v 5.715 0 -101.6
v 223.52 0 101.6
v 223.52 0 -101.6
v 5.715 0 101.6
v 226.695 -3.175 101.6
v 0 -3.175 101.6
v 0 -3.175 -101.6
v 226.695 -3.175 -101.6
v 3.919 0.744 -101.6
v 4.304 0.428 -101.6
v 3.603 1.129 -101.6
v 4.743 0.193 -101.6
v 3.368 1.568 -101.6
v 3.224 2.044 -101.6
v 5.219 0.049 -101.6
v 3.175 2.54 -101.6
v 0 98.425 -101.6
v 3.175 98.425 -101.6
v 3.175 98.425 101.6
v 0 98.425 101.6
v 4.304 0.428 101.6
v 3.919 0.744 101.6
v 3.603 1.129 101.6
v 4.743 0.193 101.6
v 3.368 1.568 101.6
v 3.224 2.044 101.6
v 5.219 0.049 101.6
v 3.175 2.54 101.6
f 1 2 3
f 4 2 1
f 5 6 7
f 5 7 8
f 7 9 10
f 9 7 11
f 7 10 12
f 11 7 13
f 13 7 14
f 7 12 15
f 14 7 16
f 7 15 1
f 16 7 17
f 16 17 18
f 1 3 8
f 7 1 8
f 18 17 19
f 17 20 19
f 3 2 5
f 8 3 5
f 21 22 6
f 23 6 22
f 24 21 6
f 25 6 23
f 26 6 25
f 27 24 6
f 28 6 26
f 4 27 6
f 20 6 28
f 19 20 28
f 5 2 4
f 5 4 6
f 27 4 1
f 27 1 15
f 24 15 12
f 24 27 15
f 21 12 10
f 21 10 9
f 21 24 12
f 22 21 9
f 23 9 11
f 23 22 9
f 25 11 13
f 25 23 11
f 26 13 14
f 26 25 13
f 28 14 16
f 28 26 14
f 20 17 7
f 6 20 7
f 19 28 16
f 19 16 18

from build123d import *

# Parameters (mm, degrees)
SKETCH1_W           = 3.175
SKETCH1_H           = 98.425
BOSS_EXTRUDE1_DEPTH = 101.6
CHAMFER1_SIZE       = 5.08


with BuildPart() as part:
    # Sketch1 → Boss-Extrude1 (new, symmetric)
    with BuildSketch(Plane.XY):
        Polygon((3.175, 0), (0, 0), (0, -3.175), (228.6, -3.175), (228.6, 0), (5.715, 0), align=None)
        with Locations((1.5875, 49.2125)):
            Rectangle(SKETCH1_W, SKETCH1_H)
        with BuildLine():
            Line((3.175, 2.54), (3.175, 0))
            Line((3.175, 0), (5.715, 0))
            ThreePointArc((5.715, 0), (3.918948776, 0.743948776), (3.175, 2.54))
        make_face()
    extrude(amount=BOSS_EXTRUDE1_DEPTH, both=True)

    # Chamfer1
    # the kernel refuses this chamfer: 5.08 mm, written as the material it takes off along each edge
    with BuildSketch(Plane(origin=(228.6, 0, 114.664149579), x_dir=(-0.9996219169112968, 0.027495876610586324, 0), z_dir=(0, 0, -1))) as chamfer1_piece_1:
        Polygon((CHAMFER1_SIZE * 0.999621916911, -CHAMFER1_SIZE * 0.0274958766106), (-CHAMFER1_SIZE * 0.0274958766106, -CHAMFER1_SIZE * 0.999621916911), (0, 0), align=None)
    extrude(amount=229.328299158, mode=Mode.SUBTRACT)


solid = part.part
